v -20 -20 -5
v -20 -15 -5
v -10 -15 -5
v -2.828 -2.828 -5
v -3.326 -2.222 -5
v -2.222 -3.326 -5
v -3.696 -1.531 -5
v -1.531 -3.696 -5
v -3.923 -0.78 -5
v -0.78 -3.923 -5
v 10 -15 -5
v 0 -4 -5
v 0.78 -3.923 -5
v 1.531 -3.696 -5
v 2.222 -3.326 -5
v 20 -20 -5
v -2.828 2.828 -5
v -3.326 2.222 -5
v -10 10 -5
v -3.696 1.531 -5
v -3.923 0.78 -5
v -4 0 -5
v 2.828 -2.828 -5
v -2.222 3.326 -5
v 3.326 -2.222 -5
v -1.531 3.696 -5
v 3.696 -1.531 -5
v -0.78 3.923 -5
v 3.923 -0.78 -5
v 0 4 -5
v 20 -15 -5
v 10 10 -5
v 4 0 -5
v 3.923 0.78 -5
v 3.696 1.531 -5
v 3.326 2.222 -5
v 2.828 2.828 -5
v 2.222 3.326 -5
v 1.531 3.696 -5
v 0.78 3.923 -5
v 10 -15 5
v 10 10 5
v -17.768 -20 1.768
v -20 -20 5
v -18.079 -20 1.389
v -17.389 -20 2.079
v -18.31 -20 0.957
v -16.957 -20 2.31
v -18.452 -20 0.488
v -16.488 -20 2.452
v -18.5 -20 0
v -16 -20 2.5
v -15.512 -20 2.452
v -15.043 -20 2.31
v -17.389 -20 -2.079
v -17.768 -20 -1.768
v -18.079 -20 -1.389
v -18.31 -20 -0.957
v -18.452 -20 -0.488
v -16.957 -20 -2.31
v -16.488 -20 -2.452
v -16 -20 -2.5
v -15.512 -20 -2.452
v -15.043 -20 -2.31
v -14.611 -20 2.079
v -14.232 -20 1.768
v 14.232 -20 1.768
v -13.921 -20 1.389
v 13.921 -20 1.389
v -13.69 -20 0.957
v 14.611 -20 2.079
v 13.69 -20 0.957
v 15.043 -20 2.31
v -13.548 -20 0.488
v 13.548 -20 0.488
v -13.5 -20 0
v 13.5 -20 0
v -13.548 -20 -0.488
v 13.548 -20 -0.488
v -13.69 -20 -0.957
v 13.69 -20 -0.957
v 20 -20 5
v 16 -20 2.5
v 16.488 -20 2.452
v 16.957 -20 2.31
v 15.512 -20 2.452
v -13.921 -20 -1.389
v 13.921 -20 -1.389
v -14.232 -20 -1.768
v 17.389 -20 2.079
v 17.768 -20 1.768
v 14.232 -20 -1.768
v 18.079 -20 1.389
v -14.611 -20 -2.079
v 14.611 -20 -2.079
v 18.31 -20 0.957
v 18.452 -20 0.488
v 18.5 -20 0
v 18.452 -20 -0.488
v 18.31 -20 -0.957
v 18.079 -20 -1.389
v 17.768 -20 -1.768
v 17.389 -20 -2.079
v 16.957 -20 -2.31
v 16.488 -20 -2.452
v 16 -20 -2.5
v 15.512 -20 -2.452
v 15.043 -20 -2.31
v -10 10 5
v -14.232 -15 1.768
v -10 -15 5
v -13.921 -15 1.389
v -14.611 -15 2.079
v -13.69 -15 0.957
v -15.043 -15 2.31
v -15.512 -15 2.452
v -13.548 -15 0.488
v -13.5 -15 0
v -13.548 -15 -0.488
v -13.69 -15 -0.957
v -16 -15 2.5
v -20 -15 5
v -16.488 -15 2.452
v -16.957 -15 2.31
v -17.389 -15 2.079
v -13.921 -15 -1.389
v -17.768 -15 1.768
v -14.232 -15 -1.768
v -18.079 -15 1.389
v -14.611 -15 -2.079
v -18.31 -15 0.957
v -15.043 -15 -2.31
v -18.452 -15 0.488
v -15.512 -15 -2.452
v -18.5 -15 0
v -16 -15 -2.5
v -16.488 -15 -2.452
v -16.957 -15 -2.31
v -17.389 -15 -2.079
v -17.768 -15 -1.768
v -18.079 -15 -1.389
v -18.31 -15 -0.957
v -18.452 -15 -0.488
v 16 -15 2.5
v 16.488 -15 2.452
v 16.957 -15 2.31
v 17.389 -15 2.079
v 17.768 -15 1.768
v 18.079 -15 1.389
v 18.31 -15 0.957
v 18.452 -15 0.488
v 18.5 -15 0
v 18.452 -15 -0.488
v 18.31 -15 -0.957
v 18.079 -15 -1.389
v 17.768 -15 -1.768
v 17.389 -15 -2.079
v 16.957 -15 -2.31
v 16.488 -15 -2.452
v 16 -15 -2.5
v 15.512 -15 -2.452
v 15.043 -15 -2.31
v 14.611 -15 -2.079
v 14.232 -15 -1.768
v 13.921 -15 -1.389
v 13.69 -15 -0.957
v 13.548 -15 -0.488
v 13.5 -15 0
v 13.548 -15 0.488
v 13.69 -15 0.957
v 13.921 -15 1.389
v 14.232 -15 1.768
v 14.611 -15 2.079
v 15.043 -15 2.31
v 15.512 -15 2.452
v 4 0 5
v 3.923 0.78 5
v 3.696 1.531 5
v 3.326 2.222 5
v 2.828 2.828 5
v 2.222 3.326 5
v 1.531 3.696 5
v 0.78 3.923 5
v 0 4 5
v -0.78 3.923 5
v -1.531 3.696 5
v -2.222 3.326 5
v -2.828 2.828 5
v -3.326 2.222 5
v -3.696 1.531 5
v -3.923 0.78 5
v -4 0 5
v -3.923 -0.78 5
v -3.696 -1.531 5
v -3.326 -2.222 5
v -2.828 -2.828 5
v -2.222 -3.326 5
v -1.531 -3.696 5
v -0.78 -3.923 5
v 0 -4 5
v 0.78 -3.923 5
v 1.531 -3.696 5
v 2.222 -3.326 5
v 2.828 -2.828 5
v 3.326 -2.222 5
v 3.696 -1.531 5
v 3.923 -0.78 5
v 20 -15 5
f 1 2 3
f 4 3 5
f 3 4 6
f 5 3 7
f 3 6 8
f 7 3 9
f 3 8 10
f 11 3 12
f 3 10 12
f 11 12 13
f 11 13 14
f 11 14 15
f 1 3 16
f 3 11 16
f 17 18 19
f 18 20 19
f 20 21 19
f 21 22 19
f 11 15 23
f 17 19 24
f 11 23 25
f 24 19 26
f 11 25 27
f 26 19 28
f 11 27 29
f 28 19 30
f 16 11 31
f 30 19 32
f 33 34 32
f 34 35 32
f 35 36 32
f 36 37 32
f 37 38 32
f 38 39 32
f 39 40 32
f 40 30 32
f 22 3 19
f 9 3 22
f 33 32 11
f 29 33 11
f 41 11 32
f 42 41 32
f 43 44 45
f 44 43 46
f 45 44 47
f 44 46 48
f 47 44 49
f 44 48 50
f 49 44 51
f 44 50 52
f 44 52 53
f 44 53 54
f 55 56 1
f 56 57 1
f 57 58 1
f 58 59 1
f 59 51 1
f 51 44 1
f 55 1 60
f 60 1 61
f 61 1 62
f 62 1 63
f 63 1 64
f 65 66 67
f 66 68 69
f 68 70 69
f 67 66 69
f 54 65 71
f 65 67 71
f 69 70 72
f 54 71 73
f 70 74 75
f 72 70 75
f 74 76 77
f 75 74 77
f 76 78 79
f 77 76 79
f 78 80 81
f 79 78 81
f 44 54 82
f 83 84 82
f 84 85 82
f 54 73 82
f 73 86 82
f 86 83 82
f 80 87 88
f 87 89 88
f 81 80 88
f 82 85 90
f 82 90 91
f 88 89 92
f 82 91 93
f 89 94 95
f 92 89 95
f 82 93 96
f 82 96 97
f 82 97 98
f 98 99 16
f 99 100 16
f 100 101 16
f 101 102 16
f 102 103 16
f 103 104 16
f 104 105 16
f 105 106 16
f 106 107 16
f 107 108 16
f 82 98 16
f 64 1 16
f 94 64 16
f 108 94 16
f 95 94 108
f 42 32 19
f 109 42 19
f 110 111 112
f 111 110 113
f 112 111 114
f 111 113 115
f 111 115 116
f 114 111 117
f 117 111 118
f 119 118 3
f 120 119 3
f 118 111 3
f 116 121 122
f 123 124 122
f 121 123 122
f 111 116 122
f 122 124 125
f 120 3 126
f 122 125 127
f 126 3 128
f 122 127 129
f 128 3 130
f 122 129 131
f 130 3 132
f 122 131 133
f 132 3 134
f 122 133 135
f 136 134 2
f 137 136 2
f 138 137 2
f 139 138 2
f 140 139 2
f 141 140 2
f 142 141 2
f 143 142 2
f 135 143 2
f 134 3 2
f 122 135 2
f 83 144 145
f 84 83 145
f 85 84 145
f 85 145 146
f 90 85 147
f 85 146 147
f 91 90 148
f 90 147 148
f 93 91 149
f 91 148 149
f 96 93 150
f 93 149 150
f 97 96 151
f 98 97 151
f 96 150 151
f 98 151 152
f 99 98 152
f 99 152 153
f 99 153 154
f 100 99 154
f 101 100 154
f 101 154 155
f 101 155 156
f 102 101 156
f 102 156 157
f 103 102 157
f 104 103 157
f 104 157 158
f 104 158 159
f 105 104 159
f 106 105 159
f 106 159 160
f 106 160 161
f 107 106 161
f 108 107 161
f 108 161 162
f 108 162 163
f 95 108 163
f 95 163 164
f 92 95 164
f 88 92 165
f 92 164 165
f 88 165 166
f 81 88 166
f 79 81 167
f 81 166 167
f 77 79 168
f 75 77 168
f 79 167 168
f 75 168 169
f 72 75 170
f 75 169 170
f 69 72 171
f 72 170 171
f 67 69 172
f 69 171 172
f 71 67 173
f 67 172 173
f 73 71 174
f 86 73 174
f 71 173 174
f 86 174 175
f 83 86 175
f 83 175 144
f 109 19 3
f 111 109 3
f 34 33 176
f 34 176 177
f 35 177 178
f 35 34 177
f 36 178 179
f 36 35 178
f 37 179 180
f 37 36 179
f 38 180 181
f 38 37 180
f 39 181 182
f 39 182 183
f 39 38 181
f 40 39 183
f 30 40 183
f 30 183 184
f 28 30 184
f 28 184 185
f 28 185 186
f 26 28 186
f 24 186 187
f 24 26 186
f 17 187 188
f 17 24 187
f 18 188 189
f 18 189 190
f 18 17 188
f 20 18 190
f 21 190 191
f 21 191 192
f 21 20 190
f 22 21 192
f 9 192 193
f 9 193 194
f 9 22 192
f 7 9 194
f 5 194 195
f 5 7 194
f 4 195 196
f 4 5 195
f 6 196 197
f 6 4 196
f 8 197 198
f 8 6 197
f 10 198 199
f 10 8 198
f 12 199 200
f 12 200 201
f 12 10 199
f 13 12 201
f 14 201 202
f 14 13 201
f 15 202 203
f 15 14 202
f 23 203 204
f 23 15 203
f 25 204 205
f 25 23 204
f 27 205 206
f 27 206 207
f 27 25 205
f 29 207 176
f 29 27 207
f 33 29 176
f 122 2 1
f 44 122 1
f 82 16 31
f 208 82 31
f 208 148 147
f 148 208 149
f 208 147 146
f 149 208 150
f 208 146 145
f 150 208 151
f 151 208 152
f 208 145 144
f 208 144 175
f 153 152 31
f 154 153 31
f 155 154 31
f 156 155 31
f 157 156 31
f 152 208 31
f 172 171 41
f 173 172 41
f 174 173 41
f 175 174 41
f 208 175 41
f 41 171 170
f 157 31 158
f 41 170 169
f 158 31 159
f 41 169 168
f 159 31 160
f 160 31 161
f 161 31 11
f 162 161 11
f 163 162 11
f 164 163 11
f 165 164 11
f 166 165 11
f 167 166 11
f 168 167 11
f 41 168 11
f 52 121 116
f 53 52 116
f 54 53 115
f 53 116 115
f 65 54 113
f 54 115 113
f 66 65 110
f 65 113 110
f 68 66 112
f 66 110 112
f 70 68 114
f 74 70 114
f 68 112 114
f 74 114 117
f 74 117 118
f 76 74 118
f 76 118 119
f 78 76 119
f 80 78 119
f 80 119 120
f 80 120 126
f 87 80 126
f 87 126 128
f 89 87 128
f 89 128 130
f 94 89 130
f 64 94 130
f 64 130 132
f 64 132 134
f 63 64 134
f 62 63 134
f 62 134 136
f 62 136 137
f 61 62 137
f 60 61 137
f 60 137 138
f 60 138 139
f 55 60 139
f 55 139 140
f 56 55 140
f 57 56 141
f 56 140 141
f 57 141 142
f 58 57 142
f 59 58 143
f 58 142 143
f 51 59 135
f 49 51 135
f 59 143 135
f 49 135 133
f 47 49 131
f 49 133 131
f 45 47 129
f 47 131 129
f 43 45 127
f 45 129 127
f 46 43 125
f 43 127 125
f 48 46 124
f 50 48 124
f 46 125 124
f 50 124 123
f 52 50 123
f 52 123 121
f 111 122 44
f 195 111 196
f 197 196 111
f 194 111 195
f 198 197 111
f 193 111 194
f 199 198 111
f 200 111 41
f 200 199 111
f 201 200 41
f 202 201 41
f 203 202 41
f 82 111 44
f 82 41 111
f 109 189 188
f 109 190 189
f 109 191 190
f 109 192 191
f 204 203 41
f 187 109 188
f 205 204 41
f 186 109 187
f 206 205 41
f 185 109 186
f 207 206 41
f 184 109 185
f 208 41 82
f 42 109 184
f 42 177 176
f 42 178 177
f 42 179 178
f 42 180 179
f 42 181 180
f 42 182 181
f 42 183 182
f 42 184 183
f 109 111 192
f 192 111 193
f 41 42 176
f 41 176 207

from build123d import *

# Parameters (mm, degrees)
RESSALTO_EXTRUS_O1_DEPTH      = 5
RESSALTO_EXTRUS_O1_DEPTH_BACK = 5
CORTE_EXTRUS_O1_DEPTH         = 5
CORTE_EXTRUS_O1_DEPTH_BACK    = 5
ESBO_O2_R                     = 4
ESBO_O3_R                     = 2.5
CORTE_EXTRUS_O2_DEPTH         = 29.722813233


with BuildPart() as part:
    # Esboço1 → Ressalto-extrusão1 (new, two sides: drawn at the far end of the back side and taken through both)
    with BuildSketch(Plane.XY.offset(-RESSALTO_EXTRUS_O1_DEPTH_BACK)):
        Polygon((-10, 10), (-10, -15), (-20, -15), (-20, -20), (20, -20), (20, -15), (10, -15), (10, 10), align=None)
    extrude(amount=RESSALTO_EXTRUS_O1_DEPTH + RESSALTO_EXTRUS_O1_DEPTH_BACK)

    # Esboço2 → Corte-extrusão1 (cut, two sides: drawn at the far end of the back side and taken through both)
    with BuildSketch(Plane.XY.offset(-CORTE_EXTRUS_O1_DEPTH_BACK)):
        Circle(ESBO_O2_R)
    extrude(amount=CORTE_EXTRUS_O1_DEPTH + CORTE_EXTRUS_O1_DEPTH_BACK, mode=Mode.SUBTRACT)

    # Esboço3 → Corte-extrusão2 (cut, through all)
    with BuildSketch(Plane(origin=(0, 0, 0), x_dir=(1, 0, 0), z_dir=(0, 1, 0))):
        with Locations((-16, 0)):
            Circle(ESBO_O3_R)
        with Locations((16, 0)):
            Circle(ESBO_O3_R)
    extrude(amount=-CORTE_EXTRUS_O2_DEPTH, mode=Mode.SUBTRACT)


solid = part.part
